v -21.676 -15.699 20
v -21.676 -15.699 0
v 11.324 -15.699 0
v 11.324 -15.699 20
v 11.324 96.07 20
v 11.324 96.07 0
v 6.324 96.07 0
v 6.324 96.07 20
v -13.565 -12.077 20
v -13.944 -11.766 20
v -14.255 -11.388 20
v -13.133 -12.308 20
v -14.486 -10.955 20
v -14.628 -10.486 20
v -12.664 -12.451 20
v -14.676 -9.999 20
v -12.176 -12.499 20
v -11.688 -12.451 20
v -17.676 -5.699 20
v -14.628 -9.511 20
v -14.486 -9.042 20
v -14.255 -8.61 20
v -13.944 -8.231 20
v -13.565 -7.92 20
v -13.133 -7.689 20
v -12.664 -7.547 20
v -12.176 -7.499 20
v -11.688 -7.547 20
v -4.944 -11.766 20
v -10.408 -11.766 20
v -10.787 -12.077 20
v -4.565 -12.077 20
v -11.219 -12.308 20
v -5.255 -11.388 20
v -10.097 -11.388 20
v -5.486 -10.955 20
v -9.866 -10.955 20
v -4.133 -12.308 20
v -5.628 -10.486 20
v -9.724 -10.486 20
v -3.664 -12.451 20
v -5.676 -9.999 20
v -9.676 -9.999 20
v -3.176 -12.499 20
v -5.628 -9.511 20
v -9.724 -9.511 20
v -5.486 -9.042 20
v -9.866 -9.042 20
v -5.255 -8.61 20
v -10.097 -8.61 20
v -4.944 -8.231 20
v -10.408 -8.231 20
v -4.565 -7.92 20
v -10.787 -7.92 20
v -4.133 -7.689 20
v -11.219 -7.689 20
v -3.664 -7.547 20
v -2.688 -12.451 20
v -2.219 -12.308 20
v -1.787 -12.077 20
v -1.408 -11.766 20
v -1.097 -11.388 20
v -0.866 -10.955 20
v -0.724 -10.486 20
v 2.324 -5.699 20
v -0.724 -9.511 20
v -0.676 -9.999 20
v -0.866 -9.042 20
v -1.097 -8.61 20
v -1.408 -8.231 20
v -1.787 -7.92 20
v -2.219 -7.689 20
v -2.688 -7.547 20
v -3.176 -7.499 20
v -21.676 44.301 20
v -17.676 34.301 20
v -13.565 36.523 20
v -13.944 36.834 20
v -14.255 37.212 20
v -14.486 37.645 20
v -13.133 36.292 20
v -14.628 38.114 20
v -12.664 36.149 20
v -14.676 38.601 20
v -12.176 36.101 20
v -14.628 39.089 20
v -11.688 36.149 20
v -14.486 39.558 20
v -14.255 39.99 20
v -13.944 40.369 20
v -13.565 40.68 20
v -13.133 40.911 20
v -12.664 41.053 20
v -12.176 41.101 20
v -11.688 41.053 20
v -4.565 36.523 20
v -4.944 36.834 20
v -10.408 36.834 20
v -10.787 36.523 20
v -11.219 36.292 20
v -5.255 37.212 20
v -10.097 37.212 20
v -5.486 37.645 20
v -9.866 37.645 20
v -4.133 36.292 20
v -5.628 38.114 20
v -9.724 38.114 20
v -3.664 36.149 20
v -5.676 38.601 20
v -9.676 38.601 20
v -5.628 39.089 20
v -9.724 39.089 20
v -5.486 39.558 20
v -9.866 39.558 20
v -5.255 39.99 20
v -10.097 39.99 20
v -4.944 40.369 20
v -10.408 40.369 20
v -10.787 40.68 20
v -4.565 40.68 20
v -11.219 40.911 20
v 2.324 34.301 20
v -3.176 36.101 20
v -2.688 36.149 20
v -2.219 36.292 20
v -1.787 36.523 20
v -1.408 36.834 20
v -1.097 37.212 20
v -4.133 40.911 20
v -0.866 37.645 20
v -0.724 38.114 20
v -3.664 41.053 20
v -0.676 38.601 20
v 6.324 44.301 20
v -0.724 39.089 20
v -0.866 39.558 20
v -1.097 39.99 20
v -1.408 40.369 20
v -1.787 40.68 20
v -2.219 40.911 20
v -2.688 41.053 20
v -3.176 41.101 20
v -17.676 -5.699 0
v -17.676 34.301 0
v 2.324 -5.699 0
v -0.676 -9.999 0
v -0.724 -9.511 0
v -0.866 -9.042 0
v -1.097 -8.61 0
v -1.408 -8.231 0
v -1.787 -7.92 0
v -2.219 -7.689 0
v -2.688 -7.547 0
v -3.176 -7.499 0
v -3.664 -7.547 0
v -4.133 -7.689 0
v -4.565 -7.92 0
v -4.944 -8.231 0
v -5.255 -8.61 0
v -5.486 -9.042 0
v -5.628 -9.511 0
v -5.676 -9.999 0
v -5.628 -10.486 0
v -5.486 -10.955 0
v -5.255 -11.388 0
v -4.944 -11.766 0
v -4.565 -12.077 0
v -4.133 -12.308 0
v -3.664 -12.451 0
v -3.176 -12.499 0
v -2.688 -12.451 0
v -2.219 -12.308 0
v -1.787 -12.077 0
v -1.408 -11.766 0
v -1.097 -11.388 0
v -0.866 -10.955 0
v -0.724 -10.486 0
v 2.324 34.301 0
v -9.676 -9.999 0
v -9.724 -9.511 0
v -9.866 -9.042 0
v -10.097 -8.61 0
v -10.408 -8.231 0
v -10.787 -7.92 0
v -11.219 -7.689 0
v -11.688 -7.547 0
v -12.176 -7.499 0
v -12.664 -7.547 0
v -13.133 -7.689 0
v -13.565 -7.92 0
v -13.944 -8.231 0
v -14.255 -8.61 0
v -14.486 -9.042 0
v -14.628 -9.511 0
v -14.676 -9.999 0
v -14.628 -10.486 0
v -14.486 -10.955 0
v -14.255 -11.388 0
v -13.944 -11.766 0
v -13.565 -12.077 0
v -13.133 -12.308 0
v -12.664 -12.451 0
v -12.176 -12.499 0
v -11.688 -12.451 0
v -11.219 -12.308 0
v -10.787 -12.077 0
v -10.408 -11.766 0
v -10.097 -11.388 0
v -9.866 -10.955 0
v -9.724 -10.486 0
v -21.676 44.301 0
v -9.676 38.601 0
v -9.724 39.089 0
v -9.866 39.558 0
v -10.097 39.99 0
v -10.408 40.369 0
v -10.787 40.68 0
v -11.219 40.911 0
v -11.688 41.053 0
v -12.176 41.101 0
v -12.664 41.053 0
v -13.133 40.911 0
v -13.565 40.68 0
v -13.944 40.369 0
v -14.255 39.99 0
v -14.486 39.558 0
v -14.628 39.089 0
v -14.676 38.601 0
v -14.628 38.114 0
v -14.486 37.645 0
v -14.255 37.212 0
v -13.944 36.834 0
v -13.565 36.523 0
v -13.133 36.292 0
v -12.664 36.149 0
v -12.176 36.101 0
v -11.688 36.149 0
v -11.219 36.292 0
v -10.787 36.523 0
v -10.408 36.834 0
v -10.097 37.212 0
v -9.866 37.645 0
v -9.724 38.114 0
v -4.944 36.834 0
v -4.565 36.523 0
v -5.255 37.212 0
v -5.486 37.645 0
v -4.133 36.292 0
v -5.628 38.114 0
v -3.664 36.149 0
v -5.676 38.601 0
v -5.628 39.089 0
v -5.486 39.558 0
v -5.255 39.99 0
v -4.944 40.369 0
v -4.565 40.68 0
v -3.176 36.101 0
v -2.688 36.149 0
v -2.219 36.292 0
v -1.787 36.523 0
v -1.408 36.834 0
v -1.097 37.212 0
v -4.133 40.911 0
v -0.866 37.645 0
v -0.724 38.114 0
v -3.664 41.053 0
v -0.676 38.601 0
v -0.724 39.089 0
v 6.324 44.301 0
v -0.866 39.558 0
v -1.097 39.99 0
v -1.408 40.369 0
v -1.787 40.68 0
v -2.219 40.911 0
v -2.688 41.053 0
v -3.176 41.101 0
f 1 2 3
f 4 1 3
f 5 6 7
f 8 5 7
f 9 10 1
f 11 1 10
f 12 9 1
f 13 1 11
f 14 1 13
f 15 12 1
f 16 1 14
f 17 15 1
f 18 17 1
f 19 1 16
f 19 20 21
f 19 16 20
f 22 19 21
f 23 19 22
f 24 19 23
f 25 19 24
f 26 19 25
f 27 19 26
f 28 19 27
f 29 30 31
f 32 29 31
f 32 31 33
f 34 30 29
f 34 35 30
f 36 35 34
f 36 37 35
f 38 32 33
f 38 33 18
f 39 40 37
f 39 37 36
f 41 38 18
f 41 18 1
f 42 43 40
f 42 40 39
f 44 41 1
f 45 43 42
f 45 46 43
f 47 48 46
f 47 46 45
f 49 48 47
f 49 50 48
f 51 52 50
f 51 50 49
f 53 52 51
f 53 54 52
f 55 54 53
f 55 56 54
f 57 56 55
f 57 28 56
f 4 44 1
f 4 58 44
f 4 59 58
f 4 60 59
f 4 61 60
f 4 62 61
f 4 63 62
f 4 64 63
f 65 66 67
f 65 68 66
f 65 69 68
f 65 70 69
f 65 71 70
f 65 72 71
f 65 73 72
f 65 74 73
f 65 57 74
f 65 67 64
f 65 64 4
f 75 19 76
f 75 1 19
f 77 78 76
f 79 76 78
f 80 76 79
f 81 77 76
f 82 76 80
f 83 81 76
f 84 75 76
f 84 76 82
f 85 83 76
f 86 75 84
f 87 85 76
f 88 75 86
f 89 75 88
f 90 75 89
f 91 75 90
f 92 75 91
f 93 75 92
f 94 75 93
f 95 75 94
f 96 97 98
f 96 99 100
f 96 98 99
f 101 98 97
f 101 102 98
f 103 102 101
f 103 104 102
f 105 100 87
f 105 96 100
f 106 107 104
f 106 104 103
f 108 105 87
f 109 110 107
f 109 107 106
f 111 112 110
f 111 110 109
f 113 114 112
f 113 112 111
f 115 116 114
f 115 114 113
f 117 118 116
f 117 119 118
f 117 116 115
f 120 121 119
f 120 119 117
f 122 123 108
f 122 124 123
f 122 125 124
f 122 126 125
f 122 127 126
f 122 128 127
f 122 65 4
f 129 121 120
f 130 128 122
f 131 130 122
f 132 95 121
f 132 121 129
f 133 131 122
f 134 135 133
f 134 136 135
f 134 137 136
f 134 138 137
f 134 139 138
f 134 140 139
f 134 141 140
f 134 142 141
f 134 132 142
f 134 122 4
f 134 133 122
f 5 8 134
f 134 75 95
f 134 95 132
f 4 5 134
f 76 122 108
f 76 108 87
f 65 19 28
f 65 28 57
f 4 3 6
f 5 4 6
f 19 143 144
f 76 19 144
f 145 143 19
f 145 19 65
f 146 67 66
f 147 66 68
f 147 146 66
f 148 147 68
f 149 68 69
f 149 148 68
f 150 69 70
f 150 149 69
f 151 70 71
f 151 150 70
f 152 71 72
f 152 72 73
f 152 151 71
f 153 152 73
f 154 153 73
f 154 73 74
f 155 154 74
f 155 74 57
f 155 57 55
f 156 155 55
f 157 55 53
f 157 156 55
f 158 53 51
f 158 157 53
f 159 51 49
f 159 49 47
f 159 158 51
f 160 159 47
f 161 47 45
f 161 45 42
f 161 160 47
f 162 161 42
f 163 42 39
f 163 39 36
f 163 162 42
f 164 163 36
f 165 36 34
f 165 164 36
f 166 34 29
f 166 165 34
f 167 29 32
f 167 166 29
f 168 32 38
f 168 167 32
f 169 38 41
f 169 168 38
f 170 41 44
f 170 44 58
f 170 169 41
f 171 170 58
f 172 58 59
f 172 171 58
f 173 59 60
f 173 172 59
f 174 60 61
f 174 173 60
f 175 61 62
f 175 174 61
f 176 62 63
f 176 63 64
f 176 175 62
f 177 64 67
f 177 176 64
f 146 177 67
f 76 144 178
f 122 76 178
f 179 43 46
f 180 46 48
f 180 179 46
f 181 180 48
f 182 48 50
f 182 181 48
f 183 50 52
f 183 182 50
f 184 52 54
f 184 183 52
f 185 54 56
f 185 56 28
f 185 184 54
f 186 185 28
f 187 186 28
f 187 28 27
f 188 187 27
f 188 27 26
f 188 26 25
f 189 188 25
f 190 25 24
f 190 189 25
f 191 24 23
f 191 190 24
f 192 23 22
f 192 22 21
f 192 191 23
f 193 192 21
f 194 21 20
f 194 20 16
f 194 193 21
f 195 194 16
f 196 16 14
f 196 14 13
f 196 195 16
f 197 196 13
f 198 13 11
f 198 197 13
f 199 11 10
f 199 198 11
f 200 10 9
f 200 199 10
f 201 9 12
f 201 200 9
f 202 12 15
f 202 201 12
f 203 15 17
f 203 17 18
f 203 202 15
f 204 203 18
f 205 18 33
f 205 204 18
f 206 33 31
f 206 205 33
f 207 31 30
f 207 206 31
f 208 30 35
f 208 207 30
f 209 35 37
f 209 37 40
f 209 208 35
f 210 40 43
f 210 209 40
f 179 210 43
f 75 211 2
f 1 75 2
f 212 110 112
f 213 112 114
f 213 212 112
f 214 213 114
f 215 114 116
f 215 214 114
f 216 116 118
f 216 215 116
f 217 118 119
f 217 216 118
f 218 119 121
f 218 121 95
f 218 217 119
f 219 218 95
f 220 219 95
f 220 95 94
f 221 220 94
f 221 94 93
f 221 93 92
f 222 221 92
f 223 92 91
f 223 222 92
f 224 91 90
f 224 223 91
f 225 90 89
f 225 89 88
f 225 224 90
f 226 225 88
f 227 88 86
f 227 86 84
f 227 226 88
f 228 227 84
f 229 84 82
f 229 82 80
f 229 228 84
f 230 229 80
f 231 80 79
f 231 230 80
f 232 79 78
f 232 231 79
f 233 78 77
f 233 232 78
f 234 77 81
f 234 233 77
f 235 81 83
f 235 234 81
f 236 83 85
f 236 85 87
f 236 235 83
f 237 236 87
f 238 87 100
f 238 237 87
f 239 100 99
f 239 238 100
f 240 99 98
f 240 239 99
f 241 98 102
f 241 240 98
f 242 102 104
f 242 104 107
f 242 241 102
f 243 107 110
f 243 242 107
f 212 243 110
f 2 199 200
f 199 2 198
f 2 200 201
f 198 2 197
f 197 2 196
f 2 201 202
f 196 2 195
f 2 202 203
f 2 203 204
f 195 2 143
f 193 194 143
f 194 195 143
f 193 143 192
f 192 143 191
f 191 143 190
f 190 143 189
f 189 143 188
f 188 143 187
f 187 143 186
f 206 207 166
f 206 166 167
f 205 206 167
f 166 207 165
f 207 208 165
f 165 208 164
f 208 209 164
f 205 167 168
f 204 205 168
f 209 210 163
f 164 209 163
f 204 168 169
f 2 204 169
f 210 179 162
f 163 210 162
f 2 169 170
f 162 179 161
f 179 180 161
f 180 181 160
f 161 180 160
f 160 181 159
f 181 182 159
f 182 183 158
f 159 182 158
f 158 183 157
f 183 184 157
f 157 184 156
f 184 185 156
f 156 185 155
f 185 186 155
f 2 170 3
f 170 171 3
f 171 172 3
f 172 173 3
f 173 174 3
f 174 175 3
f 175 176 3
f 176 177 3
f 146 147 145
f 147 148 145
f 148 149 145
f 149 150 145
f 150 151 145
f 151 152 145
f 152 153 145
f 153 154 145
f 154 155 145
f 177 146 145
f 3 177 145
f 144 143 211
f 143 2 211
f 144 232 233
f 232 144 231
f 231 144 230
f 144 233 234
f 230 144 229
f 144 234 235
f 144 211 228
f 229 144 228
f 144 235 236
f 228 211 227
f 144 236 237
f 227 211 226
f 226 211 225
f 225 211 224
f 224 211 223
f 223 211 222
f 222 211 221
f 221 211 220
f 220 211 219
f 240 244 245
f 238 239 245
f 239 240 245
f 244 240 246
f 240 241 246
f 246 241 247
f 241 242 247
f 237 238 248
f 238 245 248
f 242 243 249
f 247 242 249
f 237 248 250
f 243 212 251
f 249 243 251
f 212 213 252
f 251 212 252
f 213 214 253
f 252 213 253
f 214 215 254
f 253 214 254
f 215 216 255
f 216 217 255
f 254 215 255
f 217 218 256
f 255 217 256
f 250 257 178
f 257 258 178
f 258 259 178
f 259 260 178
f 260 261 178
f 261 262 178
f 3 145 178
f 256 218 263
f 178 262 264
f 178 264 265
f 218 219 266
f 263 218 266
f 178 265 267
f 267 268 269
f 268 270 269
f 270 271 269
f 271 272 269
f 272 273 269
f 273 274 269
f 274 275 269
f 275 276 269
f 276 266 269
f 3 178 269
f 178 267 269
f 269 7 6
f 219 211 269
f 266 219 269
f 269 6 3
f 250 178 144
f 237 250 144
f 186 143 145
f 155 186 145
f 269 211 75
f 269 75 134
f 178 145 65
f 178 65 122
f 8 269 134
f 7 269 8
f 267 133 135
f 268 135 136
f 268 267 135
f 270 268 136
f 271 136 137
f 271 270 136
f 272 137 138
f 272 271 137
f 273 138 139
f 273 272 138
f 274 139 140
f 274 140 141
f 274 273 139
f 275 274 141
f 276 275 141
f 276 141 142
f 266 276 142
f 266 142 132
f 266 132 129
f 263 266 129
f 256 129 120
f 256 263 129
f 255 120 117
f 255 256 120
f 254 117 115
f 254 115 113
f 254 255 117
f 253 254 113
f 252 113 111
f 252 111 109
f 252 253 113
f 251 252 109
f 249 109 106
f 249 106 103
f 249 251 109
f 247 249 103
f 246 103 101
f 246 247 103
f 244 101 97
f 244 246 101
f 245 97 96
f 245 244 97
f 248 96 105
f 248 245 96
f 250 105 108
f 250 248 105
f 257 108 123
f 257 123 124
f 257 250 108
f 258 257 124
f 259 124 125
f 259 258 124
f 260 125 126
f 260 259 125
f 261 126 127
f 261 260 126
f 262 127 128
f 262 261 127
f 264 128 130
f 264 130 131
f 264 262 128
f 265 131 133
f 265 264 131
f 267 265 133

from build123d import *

# Parameters (mm, degrees)
ESBO_O1_R                = 2.5
ESBO_O1_W                = 20
ESBO_O1_H                = 40
RESSALTO_EXTRUS_O1_DEPTH = 20
RESSALTO_EXTRUS_O2_DEPTH = 20


with BuildPart() as part:
    # Esboço1 → Ressalto-extrusão1 (new body)
    with BuildSketch(Plane.XY):
        Polygon((2.323964608, -15.698616601), (-17.676035392, -15.698616601), (-21.676035392, -15.698616601), (-21.676035392, 34.301383399), (-21.676035392, 44.301383399), (6.323964608, 44.301383399), (6.323964608, 34.301383399), (6.323964608, -15.698616601), align=None)
        with Locations((-12.176035392, -9.998616601)):
            Circle(ESBO_O1_R, mode=Mode.SUBTRACT)
        with Locations((-3.176035392, -9.998616601)):
            Circle(ESBO_O1_R, mode=Mode.SUBTRACT)
        with Locations((-12.176035392, 38.601383399)):
            Circle(ESBO_O1_R, mode=Mode.SUBTRACT)
        with Locations((-3.176035392, 38.601383399)):
            Circle(ESBO_O1_R, mode=Mode.SUBTRACT)
        with Locations((-7.676035392, 14.301383399)):
            Rectangle(ESBO_O1_W, ESBO_O1_H, mode=Mode.SUBTRACT)
    extrude(amount=RESSALTO_EXTRUS_O1_DEPTH)

    # Esboço2 → Ressalto-extrusão2 (add)
    with BuildSketch(Plane(origin=(0, 0, 0), x_dir=(-1, 0, 0), z_dir=(0, 0, -1))):
        Polygon((-6.323964608, 44.301383399), (-6.323964608, -15.698616601), (-11.323964608, -15.698616601), (-11.323964608, 96.069751334), (-6.323964608, 96.069751334), align=None)
    extrude(amount=-RESSALTO_EXTRUS_O2_DEPTH)


solid = part.part
